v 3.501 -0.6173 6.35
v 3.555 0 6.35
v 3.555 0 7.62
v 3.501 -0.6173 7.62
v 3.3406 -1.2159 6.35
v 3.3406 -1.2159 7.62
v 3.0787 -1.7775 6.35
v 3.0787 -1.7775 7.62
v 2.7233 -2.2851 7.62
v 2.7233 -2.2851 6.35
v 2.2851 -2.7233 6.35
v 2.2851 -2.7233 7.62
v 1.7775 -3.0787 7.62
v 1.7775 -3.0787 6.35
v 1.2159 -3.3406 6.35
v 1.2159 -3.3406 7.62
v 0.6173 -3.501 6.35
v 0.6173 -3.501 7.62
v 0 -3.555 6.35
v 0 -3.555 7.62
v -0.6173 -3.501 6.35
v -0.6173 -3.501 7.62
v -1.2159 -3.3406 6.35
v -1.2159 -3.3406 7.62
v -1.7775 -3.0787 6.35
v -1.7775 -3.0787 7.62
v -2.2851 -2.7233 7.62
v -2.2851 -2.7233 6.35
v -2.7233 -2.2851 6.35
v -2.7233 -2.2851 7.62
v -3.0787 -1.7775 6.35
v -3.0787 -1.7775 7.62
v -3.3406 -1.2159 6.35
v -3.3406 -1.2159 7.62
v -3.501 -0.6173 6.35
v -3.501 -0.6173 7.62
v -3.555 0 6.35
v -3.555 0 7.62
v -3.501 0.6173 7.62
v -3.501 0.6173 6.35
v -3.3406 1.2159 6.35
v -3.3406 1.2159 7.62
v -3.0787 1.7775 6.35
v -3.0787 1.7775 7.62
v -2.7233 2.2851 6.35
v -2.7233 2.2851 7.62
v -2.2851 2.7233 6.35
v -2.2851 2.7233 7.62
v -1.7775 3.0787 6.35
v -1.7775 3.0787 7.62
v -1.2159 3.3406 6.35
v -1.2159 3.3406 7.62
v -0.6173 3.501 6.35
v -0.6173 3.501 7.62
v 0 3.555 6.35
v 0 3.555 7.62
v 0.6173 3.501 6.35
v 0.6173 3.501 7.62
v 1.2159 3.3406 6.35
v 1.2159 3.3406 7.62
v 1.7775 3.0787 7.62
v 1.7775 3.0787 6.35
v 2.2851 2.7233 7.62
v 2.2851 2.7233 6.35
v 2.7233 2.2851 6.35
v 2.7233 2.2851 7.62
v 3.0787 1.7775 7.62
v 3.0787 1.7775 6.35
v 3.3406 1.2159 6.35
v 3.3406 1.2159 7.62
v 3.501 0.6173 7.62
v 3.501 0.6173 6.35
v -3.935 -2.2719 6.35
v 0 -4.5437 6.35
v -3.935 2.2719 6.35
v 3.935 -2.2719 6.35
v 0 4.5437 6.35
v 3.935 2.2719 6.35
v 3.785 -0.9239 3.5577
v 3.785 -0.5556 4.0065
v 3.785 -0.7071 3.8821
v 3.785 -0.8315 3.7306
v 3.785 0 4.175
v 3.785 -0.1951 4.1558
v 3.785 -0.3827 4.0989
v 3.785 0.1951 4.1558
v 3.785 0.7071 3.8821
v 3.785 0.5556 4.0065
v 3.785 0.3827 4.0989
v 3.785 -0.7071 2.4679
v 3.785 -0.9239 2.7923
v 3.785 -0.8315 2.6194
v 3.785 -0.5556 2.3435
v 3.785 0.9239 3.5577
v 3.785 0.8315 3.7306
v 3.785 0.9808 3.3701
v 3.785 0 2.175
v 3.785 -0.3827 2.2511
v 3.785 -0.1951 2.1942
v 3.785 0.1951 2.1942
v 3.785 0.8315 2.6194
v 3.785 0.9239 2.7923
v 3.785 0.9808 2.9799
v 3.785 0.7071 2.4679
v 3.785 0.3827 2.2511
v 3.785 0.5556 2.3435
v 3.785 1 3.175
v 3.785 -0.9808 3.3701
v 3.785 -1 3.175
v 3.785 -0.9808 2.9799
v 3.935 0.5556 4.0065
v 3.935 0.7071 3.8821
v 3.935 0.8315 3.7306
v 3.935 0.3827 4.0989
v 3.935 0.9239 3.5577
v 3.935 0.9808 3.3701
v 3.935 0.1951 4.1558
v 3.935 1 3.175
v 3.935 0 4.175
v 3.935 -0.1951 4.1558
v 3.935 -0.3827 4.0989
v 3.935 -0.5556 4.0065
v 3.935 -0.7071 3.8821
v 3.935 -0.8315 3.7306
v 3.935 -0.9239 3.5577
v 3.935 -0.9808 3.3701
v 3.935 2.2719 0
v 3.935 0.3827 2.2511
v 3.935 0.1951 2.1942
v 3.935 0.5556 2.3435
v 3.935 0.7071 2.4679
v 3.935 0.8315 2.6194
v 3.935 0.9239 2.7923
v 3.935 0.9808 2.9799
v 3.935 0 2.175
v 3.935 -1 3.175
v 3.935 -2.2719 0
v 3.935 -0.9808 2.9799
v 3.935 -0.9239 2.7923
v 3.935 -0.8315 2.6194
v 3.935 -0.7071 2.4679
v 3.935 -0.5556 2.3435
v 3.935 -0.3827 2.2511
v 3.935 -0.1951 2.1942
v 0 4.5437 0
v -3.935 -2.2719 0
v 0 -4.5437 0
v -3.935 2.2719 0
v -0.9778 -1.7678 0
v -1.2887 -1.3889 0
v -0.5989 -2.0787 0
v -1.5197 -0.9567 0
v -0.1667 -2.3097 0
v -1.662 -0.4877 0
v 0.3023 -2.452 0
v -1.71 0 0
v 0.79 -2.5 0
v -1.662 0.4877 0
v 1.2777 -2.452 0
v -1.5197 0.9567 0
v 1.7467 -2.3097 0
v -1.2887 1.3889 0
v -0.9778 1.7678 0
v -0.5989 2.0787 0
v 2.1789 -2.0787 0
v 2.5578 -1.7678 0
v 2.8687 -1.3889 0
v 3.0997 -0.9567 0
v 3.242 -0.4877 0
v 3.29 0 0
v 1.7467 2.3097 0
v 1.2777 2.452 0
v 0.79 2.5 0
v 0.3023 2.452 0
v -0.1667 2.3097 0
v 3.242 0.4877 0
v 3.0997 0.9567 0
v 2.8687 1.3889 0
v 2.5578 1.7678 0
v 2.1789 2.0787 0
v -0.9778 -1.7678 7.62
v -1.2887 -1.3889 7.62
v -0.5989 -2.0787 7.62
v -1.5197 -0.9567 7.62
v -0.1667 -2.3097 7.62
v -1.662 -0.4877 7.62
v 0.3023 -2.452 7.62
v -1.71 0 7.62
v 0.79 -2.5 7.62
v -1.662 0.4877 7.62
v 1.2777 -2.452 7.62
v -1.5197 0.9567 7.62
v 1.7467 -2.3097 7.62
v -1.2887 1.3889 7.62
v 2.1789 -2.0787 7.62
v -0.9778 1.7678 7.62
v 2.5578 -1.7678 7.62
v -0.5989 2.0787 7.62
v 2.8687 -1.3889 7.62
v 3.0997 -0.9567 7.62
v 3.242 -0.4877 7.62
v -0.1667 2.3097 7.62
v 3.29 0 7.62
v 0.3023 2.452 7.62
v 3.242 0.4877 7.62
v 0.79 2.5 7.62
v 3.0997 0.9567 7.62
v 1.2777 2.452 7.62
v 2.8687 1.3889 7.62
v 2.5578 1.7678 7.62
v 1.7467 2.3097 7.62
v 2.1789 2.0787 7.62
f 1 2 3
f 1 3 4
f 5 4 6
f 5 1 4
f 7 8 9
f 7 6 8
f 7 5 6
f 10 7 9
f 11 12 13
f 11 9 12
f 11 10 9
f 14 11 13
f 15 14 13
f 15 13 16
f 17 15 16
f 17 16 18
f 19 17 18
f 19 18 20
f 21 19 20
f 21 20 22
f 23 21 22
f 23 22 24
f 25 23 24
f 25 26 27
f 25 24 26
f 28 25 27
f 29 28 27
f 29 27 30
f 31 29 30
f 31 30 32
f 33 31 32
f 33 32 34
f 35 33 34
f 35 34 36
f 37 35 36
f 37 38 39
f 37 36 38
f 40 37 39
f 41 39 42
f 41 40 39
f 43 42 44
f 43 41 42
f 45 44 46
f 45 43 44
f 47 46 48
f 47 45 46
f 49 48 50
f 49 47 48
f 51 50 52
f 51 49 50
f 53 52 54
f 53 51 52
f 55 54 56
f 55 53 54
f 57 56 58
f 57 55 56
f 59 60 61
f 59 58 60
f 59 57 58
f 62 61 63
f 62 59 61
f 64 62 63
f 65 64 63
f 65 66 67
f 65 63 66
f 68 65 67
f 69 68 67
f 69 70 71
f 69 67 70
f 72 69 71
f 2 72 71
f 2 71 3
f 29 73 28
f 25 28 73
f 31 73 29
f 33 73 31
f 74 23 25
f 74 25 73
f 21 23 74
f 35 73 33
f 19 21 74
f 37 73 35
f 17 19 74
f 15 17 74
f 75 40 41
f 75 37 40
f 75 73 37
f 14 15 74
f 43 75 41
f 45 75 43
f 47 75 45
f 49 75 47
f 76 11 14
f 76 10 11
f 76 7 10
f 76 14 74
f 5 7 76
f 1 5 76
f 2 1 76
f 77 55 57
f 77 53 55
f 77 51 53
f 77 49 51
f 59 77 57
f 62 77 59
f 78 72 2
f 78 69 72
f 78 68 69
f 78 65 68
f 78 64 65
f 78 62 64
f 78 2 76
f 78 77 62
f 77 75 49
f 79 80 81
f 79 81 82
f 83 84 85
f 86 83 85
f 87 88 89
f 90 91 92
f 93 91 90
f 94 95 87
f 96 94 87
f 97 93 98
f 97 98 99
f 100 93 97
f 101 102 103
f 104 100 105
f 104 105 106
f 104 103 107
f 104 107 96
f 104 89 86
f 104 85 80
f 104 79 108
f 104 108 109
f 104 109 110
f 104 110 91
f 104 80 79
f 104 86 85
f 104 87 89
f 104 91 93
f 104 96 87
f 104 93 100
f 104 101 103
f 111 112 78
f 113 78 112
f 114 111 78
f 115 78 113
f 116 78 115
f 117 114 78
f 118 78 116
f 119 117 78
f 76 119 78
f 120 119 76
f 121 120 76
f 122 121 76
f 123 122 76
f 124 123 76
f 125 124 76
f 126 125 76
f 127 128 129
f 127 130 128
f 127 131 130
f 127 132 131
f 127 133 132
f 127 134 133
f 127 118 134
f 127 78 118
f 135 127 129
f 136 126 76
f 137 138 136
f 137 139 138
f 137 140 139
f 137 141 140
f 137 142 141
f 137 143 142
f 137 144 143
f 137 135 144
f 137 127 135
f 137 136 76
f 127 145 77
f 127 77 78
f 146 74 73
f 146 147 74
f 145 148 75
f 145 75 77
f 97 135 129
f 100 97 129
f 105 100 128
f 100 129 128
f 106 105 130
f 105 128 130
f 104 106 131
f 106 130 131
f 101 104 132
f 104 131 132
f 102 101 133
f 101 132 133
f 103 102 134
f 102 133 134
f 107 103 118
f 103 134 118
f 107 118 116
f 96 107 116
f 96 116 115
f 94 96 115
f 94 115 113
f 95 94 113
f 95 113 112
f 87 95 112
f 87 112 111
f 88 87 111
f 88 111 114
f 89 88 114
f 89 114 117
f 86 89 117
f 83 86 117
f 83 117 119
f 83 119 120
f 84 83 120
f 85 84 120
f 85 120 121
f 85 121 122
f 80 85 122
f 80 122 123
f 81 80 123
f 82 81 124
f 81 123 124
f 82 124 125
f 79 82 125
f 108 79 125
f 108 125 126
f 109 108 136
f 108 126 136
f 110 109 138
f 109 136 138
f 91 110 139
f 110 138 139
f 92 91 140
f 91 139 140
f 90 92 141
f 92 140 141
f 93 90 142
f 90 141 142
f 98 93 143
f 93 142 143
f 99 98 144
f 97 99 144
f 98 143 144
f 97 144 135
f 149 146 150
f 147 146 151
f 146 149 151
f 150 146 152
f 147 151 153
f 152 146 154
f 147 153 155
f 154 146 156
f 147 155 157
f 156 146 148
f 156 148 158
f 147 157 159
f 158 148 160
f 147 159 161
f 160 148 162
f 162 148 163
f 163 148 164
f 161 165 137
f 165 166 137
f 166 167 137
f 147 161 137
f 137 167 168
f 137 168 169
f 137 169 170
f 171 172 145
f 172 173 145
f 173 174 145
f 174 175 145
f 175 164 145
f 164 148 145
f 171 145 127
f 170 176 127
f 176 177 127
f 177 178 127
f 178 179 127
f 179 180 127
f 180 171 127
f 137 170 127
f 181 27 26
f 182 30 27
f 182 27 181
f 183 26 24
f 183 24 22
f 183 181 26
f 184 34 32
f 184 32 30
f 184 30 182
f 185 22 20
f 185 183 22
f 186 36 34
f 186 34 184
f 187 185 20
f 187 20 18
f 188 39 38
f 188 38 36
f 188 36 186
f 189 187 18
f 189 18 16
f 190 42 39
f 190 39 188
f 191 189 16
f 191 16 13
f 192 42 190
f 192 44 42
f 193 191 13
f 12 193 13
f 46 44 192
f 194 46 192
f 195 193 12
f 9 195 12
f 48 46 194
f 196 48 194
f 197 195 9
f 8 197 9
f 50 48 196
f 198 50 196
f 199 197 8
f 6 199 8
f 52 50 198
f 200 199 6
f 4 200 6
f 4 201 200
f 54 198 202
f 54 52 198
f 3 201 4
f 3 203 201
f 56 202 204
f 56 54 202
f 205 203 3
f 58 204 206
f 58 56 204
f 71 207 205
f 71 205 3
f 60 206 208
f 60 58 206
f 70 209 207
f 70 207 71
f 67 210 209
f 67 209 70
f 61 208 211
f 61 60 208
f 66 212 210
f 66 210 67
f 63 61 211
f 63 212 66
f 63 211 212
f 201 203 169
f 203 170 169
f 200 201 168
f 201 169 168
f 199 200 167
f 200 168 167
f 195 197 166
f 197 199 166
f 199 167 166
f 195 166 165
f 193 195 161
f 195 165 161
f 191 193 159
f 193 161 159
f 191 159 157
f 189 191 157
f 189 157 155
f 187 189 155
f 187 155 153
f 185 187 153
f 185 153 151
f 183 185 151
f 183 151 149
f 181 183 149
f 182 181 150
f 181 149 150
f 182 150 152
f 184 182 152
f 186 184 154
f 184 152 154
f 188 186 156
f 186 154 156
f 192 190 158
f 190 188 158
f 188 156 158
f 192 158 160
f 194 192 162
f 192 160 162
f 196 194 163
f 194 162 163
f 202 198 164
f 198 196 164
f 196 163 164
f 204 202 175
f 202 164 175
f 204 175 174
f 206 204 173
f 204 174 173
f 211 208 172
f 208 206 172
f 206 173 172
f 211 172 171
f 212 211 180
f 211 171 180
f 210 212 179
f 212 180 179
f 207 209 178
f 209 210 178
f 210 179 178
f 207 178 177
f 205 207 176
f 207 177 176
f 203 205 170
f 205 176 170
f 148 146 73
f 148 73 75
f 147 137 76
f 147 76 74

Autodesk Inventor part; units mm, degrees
ref_plane "YZ Plane" through (0, 0, 0) normal (1, 0, 0) x (0, 1, 0)
ref_plane "XZ Plane" through (0, 0, 0) normal (0, 1, 0) x (-1, 0, 0)
ref_plane "XY Plane" through (0, 0, 0) normal (0, 0, 1) x (1, 0, 0)
sketch "Sketch1" plane through (0, 0, 0) normal (0, 0, 1) x (1, 0, 0)
  line L0 (3.935, -2.2719) -> (0, -4.5437)
  line L1 (0, -4.5437) -> (-3.935, -2.2719)
  line L2 (-3.935, -2.2719) -> (-3.935, 2.2719)
  line L3 (-3.935, 2.2719) -> (0, 4.5437)
  line L4 (0, 4.5437) -> (3.935, 2.2719)
  line L5 (3.935, 2.2719) -> (3.935, -2.2719)
  circle A0 centre (0.79, 0) radius 2.5
  point P0 (0, 0)
  point P1 (0, 0)
  dimension "d0" = 7.87
  dimension "d1" = 0.79
  dimension "d2" = 5
extrude "Extrusion1" add sketch "Sketch1" along normal blind 6.35
sketch "Sketch2" plane through (0, 0, 6.35) normal (0, 0, 1) x (1, 0, 0)
  circle A0 centre (0.79, 0) radius 2.5 projected
  circle A1 centre (0, 0) radius 3.555
  dimension "d5" = 7.11
extrude "Extrusion2" add sketch "Sketch2" along normal blind 1.27
sketch "Sketch3" plane through (3.935, -2.2719, 0) normal (1, 0, 0) x (0, 0, -1)
  circle A0 centre (-3.175, 2.2719) radius 1
  point P0 (0, 2.2719)
  dimension "d8" = 2
extrude "Extrusion3" cut sketch "Sketch3" against normal blind 0.15
properties part number "Eccentric M5 Spacer" material "Stainless Steel"
